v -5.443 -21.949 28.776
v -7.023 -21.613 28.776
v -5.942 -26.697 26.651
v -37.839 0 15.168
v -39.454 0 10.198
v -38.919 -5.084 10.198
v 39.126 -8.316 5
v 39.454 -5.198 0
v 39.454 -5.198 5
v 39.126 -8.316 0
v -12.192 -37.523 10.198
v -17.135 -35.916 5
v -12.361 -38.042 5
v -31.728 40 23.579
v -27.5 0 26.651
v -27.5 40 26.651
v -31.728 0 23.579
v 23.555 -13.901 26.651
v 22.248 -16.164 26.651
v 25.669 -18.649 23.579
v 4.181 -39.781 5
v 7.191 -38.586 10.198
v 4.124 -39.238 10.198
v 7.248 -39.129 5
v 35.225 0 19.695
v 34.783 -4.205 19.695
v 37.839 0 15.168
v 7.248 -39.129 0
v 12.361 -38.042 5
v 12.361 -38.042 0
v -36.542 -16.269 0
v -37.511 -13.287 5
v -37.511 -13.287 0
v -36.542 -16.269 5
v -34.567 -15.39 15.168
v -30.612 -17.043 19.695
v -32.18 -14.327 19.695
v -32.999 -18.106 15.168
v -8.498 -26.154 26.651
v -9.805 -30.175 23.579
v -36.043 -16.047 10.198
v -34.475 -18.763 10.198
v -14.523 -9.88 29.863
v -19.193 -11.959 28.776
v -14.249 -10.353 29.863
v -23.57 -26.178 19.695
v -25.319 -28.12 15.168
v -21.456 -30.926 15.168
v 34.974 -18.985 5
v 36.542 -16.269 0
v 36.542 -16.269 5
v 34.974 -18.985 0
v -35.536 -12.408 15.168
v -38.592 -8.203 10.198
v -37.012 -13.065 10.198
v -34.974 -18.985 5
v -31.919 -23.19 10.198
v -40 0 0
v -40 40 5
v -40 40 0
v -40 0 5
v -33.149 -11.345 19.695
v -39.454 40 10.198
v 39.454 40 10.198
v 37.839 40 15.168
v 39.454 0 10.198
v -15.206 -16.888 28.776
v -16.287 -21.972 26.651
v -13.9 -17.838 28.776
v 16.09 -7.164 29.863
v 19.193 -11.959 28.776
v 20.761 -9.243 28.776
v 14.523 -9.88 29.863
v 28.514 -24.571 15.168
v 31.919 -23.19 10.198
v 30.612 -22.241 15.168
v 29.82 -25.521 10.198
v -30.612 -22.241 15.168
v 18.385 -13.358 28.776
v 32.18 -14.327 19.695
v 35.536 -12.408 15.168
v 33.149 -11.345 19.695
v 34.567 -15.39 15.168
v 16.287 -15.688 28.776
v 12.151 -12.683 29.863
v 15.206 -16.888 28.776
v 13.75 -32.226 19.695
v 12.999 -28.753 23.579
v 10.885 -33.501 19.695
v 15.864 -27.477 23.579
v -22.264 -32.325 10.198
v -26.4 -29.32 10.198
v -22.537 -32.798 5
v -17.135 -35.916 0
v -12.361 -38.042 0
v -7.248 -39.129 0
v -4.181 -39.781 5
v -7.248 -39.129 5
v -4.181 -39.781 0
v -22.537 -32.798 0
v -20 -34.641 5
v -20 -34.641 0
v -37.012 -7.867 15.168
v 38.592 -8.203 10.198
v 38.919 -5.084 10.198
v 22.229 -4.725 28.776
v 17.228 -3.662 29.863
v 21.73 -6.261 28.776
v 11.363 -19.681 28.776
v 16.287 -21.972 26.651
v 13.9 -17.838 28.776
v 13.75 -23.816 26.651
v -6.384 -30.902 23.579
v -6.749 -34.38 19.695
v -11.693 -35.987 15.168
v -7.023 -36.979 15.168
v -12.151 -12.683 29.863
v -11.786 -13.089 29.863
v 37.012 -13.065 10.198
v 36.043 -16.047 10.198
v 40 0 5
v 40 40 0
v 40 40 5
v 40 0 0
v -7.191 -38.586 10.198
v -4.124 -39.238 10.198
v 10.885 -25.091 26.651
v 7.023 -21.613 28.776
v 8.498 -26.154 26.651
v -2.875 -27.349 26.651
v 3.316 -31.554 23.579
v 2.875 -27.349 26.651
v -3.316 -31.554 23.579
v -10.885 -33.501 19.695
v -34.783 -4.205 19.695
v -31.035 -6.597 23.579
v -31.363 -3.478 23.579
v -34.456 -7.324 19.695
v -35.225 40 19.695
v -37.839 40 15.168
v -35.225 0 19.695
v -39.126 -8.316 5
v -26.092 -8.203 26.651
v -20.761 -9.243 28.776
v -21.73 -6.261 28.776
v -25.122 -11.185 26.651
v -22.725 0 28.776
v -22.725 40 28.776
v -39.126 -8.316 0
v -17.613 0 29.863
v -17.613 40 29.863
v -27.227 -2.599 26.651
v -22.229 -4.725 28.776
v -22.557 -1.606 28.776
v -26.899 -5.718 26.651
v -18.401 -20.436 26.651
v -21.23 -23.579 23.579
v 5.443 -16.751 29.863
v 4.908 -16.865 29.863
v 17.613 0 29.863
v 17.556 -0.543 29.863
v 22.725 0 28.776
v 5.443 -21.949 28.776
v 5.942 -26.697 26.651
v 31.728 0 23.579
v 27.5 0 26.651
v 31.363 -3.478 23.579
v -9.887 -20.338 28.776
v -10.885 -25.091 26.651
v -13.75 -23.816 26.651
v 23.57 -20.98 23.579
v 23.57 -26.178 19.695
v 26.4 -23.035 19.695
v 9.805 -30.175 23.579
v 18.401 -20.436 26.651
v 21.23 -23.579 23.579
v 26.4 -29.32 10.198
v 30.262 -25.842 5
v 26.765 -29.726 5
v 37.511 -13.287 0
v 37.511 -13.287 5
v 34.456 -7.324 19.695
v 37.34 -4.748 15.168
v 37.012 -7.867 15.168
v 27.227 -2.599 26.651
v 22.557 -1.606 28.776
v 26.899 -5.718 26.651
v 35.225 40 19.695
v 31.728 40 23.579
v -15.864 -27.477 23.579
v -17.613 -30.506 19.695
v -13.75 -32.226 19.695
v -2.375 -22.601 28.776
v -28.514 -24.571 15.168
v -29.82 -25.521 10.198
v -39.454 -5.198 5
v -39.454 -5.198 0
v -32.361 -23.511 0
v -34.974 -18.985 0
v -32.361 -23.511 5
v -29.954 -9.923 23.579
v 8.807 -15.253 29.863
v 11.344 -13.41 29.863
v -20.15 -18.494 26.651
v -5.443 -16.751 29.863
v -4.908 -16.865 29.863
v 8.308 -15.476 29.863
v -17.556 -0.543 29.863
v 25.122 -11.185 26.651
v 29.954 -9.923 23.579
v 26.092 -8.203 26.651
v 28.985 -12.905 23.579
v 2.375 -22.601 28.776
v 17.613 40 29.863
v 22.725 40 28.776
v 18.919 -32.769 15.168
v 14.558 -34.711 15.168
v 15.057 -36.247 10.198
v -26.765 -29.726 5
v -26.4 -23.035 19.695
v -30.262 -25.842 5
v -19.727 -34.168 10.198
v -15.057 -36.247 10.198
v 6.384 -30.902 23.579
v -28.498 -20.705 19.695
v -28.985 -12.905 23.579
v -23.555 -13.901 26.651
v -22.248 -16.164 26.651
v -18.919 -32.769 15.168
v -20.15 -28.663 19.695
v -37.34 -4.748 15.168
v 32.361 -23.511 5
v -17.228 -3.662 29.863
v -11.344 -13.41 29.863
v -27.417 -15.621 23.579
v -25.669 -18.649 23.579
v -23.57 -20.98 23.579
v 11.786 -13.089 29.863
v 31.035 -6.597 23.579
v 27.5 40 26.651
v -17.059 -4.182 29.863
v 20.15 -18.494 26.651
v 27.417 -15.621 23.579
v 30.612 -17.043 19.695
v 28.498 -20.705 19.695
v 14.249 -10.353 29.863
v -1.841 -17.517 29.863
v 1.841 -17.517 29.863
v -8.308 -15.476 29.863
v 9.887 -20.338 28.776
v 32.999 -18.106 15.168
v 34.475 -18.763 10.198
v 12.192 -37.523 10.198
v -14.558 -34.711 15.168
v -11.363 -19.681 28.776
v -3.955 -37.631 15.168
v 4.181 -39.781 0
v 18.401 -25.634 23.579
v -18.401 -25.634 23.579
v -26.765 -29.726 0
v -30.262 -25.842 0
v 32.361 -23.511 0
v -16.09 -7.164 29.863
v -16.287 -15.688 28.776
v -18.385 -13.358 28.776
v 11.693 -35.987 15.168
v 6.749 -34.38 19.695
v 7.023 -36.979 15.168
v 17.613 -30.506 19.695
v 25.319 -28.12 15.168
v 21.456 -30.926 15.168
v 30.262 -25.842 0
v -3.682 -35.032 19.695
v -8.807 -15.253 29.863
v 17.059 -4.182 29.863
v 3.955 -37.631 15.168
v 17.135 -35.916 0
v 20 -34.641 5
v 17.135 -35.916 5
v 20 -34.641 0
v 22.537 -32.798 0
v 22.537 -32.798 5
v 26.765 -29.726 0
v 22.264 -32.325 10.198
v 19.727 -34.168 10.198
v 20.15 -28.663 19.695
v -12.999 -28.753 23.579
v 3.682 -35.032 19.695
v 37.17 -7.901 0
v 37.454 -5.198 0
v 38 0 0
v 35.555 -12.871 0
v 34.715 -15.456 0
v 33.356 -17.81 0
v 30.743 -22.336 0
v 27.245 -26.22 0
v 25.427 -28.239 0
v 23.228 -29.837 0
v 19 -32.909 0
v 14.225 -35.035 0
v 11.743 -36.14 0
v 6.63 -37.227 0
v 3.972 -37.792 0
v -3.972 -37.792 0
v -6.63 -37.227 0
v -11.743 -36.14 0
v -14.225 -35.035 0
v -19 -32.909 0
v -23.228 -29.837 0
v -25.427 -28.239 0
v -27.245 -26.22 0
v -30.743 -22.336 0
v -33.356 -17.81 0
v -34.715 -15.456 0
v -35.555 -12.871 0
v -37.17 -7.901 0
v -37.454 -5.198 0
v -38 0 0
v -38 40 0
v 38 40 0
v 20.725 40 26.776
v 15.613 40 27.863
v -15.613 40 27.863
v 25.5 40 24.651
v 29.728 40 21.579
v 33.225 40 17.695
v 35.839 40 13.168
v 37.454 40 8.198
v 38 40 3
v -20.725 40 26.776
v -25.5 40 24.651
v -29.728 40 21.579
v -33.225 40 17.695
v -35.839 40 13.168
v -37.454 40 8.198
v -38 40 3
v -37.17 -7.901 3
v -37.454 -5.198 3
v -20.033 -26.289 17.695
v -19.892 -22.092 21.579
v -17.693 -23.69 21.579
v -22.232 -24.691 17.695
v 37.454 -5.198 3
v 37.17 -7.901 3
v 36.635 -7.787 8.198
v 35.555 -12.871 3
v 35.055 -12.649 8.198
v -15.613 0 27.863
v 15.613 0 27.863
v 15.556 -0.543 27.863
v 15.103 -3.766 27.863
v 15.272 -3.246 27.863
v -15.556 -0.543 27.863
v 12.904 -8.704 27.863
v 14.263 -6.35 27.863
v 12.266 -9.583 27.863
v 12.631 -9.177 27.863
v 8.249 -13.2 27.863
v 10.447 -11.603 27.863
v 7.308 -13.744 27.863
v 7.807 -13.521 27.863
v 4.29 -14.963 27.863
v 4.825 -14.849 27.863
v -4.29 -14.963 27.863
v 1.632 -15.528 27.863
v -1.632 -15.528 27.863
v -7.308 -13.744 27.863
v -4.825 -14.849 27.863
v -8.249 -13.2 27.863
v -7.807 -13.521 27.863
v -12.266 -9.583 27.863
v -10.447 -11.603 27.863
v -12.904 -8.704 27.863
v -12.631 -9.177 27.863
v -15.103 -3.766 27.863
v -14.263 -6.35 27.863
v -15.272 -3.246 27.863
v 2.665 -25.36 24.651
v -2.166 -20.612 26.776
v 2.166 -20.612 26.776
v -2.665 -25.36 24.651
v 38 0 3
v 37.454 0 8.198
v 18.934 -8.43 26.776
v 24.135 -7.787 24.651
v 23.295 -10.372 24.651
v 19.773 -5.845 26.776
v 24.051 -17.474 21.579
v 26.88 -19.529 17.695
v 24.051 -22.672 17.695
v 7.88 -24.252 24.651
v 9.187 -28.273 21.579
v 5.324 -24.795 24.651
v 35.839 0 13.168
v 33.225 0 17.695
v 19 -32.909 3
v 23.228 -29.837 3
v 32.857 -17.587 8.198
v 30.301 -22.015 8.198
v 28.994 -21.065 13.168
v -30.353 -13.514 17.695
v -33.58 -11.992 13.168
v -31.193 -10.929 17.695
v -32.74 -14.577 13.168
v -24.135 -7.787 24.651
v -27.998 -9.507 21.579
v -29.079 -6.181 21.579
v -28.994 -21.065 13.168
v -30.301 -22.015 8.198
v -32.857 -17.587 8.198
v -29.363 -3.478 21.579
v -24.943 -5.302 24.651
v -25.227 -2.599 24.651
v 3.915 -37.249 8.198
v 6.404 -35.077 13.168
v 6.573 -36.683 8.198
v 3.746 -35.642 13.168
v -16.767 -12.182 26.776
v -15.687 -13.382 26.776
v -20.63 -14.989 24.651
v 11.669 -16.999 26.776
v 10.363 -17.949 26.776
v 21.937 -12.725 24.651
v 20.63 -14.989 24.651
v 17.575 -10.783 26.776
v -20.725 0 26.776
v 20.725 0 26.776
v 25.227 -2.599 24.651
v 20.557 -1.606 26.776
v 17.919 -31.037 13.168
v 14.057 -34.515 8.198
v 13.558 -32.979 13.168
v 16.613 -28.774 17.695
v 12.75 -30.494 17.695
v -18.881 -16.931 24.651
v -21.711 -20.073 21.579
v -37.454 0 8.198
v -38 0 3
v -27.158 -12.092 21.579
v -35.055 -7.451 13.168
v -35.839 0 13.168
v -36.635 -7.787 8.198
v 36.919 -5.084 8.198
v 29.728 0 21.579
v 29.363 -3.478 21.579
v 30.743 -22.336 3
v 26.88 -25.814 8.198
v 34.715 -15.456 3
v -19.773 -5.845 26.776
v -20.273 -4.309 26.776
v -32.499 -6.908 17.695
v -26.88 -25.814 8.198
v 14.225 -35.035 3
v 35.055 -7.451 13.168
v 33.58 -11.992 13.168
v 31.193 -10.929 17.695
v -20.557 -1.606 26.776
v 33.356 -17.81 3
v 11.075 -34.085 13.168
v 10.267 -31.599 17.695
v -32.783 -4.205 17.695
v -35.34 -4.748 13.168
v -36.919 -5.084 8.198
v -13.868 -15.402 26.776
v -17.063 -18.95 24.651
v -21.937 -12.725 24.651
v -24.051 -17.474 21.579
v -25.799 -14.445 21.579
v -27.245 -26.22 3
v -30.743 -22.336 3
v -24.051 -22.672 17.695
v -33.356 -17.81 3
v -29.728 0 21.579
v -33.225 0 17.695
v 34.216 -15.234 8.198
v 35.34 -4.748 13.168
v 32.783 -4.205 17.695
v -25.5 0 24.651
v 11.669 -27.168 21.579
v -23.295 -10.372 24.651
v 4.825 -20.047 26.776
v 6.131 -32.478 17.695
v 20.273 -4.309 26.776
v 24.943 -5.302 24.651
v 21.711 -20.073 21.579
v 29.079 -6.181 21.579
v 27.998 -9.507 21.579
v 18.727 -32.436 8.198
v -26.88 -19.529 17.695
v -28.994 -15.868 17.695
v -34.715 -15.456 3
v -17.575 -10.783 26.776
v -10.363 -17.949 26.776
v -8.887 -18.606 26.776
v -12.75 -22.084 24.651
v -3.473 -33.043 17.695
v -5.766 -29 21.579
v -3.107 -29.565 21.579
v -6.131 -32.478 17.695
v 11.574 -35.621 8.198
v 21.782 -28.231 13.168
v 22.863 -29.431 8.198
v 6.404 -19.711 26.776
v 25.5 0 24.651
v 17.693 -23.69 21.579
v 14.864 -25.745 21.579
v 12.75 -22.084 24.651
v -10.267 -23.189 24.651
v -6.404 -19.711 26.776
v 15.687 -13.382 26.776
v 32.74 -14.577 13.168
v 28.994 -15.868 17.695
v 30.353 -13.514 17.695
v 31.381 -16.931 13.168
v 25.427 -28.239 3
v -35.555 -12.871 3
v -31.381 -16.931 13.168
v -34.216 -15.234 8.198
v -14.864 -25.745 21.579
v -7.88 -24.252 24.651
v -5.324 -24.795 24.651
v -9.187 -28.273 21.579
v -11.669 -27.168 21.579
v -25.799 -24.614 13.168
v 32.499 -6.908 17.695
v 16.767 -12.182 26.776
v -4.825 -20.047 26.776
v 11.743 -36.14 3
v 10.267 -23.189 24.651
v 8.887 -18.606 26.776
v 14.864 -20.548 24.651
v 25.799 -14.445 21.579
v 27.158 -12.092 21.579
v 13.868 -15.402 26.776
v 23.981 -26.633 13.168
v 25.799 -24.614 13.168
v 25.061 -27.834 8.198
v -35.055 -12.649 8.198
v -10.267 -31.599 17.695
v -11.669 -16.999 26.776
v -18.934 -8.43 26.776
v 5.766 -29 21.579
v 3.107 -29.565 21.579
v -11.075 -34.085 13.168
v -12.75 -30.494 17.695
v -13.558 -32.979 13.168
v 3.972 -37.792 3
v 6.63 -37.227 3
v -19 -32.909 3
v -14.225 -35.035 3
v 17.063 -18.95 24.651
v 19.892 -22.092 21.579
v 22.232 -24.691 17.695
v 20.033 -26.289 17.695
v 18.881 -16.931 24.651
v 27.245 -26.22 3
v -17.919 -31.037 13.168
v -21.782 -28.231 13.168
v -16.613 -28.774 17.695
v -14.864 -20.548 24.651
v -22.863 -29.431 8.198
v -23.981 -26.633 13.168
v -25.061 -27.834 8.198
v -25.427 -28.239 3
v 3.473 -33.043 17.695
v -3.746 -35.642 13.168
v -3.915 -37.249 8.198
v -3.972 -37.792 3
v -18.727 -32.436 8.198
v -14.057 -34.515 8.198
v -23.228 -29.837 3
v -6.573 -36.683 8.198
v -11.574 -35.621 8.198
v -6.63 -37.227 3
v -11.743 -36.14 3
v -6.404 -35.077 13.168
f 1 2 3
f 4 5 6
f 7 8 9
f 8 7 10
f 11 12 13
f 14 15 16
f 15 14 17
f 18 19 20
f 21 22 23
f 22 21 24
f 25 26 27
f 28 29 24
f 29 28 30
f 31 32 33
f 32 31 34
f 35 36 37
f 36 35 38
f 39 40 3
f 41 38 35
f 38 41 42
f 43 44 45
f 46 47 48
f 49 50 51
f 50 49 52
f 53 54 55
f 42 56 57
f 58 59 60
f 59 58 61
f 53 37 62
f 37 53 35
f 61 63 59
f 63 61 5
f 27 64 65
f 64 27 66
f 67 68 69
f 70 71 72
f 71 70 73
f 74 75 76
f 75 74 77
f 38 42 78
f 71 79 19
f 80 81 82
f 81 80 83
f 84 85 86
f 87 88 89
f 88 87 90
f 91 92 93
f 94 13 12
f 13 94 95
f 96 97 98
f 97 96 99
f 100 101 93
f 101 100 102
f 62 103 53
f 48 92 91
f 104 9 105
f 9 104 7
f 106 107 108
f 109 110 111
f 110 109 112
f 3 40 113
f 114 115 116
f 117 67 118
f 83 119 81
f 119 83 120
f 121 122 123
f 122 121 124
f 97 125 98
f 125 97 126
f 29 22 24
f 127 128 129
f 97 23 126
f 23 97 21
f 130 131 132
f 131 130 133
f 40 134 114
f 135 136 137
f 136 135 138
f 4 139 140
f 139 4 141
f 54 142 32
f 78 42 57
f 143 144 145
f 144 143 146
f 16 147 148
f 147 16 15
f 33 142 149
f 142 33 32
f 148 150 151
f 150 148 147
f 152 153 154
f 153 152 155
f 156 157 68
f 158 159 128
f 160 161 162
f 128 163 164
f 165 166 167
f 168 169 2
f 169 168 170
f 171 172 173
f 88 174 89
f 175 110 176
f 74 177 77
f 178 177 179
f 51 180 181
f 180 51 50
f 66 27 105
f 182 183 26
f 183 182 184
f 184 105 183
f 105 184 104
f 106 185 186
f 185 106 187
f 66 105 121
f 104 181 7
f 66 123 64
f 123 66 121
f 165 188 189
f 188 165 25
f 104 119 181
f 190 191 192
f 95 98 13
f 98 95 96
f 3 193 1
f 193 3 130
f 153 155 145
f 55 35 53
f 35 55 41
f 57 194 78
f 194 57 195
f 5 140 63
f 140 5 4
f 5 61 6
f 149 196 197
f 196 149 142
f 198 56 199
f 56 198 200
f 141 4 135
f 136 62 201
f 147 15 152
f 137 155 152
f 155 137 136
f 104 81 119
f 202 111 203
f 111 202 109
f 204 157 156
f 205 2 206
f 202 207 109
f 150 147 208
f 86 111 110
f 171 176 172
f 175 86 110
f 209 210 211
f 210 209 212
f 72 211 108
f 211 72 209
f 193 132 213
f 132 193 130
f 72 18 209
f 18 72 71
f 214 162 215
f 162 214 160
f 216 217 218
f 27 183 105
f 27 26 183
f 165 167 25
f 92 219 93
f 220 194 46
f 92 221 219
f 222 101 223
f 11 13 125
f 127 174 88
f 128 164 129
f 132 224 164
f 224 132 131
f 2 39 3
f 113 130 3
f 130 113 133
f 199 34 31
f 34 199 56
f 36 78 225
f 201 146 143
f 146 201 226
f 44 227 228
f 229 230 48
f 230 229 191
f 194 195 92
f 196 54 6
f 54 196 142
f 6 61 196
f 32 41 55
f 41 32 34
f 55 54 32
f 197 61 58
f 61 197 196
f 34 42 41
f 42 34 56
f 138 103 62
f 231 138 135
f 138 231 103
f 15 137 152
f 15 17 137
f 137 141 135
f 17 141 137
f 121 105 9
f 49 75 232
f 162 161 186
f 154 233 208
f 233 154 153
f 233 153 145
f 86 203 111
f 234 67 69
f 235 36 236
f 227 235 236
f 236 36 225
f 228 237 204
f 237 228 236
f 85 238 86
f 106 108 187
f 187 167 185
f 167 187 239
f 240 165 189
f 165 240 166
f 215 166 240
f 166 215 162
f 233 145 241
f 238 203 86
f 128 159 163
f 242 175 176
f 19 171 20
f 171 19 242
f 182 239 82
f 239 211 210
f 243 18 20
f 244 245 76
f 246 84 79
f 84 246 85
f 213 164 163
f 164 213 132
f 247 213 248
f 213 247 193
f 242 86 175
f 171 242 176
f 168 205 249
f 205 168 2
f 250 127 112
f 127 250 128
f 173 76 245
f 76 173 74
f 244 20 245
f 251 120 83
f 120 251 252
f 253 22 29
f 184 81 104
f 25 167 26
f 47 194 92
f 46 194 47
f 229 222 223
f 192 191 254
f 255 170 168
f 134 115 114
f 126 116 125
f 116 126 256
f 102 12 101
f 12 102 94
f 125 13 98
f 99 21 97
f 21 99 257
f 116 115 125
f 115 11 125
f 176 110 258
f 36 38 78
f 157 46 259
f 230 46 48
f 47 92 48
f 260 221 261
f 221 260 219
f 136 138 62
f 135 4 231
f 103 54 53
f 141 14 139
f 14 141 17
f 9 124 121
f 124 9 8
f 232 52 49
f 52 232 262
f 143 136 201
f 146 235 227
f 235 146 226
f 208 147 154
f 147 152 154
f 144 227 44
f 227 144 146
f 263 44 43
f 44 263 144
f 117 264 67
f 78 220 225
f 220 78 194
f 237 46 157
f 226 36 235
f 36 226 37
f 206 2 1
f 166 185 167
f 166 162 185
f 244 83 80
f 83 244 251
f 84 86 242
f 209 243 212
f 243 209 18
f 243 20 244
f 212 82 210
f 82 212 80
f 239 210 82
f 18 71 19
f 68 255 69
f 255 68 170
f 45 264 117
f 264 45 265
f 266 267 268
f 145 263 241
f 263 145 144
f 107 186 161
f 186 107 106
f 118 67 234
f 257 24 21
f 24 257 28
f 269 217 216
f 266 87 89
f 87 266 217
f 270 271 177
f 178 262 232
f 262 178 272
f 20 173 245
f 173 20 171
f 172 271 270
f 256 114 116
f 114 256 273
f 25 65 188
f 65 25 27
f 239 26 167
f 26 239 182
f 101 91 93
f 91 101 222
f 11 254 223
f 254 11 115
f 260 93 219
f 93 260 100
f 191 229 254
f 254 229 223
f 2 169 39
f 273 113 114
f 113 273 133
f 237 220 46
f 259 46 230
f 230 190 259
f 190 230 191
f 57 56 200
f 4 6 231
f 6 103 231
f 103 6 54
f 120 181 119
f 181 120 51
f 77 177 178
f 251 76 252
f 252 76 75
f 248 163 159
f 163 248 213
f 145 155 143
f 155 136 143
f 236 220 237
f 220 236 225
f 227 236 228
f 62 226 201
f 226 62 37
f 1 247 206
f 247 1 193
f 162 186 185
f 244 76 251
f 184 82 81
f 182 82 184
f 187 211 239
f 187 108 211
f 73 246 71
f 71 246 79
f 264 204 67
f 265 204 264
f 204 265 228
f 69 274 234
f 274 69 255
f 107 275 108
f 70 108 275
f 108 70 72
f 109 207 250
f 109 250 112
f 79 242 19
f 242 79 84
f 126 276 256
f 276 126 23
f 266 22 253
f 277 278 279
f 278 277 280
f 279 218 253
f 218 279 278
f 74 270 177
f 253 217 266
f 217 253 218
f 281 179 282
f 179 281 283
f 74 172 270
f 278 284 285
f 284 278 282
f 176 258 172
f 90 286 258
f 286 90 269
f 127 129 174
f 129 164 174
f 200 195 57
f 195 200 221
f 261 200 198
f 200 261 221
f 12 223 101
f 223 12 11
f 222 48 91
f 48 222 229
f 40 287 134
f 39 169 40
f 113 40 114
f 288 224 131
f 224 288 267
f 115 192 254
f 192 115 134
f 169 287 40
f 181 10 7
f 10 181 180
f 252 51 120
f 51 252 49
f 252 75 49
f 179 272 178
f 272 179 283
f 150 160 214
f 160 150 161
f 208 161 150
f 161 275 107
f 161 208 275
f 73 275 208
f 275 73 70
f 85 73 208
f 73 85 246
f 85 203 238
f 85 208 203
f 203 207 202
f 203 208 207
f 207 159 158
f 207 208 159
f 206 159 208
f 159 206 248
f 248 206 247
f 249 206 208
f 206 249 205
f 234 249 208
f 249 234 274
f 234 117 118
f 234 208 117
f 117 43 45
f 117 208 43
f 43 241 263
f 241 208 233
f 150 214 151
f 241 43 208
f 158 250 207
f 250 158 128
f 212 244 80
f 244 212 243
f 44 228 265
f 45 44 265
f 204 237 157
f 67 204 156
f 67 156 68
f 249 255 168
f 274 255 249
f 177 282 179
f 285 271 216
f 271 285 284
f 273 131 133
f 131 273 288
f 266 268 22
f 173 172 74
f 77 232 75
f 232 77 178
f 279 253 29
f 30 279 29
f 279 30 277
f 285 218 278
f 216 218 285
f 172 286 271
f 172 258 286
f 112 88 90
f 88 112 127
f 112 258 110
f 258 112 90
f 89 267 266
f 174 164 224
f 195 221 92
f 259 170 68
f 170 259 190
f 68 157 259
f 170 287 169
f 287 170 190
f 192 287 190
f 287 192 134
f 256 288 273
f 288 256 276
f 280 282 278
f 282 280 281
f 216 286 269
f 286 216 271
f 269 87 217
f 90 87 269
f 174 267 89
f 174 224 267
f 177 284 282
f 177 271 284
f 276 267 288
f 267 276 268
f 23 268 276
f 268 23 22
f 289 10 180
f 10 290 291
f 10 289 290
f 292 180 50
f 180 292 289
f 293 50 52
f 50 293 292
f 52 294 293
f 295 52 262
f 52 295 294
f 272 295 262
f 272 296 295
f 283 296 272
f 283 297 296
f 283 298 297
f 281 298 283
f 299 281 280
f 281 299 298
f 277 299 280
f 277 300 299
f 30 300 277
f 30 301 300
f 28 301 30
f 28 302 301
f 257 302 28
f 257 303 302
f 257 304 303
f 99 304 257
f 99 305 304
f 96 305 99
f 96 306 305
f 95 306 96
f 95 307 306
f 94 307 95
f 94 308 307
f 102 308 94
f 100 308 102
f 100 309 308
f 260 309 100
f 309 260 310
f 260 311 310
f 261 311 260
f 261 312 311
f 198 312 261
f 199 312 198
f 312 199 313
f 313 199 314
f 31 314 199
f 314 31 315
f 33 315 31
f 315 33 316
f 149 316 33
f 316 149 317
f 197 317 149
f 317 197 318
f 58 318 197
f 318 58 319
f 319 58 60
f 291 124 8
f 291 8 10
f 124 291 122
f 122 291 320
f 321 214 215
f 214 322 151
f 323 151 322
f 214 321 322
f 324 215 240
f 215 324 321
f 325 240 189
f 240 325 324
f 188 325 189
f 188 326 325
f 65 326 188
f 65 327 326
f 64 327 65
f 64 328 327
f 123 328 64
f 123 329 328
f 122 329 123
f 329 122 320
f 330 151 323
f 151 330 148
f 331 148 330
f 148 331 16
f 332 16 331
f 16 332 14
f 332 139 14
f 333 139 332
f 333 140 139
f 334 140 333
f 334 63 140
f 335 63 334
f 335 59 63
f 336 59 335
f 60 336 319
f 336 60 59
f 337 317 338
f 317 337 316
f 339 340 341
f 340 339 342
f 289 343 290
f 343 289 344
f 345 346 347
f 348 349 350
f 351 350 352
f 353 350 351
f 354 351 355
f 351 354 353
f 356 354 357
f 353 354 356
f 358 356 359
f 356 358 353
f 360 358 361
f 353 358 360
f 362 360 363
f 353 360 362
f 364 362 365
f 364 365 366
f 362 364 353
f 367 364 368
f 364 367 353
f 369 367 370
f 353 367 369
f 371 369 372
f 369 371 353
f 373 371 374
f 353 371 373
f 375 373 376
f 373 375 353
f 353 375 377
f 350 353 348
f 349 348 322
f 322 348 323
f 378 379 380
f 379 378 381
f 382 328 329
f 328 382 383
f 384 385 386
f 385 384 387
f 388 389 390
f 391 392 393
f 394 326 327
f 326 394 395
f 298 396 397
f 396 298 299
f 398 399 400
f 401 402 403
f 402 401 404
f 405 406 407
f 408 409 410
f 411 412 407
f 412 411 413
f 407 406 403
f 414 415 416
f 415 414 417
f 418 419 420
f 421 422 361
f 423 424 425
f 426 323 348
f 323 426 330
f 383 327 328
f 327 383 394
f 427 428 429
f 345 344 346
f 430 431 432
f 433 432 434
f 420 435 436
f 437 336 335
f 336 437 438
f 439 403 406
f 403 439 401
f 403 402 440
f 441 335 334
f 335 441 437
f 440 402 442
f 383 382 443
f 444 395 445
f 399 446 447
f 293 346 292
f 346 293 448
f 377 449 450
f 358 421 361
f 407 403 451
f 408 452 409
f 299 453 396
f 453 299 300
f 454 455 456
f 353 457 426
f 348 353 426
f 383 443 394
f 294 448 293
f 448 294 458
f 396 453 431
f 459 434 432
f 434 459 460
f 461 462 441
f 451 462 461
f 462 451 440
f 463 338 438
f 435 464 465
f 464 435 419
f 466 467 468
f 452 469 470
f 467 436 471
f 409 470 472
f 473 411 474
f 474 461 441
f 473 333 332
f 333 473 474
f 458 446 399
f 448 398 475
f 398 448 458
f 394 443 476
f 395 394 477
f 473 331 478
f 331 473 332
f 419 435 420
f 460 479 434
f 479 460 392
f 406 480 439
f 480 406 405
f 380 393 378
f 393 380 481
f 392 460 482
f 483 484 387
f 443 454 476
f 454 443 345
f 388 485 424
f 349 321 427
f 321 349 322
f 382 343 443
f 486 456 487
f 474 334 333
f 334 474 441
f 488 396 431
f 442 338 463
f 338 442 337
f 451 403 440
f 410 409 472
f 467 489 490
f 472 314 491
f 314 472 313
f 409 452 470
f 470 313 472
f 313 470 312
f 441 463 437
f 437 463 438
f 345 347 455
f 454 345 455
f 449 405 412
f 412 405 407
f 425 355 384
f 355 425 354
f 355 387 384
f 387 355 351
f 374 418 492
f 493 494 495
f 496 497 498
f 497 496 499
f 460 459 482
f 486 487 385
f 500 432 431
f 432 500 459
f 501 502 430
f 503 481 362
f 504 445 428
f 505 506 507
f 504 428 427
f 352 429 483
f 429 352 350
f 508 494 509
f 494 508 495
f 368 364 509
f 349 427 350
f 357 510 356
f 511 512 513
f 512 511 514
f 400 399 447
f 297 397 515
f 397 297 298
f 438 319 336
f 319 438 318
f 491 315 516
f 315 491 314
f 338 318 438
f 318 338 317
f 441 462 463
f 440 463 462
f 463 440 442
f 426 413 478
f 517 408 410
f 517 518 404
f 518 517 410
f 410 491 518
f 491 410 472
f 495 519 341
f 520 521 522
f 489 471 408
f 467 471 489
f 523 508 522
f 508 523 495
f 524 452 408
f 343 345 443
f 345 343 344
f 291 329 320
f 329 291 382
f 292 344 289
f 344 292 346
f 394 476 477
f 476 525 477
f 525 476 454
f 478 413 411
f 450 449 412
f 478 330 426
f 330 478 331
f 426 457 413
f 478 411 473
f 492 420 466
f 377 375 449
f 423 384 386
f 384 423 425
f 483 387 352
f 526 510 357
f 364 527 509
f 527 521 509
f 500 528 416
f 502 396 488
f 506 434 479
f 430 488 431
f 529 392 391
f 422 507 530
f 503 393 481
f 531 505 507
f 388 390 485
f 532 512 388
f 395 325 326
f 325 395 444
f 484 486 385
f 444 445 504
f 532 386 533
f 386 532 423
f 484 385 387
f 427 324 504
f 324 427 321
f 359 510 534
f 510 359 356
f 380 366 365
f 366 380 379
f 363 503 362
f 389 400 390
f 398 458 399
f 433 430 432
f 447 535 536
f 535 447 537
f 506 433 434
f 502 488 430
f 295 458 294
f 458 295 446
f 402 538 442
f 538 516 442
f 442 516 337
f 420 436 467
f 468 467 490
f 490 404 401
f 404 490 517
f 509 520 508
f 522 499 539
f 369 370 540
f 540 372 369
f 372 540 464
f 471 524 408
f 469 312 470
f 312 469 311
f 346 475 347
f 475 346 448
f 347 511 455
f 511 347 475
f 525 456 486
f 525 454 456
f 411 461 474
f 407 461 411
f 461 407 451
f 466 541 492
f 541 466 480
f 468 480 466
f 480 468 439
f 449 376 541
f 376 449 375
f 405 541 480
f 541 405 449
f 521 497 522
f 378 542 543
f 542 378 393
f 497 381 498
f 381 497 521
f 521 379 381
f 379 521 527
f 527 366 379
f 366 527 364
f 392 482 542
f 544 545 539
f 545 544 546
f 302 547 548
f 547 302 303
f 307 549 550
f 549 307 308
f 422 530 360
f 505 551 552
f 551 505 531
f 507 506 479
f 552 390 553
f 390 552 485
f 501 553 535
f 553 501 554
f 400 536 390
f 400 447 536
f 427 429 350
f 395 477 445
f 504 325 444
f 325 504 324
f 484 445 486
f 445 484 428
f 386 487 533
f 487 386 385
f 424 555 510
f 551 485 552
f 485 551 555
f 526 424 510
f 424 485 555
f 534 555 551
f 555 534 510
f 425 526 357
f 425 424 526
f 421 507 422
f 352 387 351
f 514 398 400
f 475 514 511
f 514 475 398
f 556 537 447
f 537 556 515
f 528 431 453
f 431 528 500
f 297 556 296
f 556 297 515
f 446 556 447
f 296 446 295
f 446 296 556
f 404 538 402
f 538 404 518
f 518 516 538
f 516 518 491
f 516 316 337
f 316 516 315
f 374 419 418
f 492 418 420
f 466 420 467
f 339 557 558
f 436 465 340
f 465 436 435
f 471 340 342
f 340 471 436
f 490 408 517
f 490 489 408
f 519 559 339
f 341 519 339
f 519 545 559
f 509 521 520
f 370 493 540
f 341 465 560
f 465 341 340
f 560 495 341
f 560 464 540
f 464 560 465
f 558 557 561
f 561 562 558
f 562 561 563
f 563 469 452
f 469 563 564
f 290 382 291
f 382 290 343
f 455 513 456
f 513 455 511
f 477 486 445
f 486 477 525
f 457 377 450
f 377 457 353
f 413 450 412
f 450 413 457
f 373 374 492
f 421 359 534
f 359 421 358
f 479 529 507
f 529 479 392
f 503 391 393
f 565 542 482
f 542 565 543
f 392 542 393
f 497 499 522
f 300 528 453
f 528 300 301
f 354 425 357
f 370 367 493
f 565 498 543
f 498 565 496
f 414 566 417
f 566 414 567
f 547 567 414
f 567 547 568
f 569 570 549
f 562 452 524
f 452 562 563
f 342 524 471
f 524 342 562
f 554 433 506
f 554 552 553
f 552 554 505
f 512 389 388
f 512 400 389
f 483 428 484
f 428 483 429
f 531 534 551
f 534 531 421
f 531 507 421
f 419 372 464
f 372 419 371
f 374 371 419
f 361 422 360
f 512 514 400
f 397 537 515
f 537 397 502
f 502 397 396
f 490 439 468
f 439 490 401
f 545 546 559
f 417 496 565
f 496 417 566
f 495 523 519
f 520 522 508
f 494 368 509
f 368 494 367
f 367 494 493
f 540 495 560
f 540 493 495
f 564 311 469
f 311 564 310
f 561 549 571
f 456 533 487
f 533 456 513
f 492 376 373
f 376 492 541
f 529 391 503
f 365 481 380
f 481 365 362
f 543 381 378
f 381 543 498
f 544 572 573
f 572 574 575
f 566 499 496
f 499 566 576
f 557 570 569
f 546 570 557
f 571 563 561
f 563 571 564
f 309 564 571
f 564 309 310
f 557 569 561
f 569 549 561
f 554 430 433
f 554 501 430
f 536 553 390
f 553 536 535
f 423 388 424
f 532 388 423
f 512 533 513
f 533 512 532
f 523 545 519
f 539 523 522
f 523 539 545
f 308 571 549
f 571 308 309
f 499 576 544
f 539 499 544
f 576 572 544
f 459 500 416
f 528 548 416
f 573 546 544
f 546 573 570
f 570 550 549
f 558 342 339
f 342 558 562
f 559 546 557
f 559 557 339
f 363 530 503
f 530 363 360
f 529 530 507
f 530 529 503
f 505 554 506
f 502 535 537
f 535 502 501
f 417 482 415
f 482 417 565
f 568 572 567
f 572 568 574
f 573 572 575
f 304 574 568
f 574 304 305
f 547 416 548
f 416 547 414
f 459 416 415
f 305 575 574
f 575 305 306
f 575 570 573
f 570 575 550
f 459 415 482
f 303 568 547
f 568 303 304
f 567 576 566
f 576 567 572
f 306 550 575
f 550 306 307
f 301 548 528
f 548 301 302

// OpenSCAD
CR = 25; /* corner radius */
SX = 80; /* size X (width) */
SY = 80; /* size Y (depth) */
H = 30; /* height */
WT = 2; /* wall thickness */

module baseShape(x, y, z) {
    difference() {
        minkowski() {
            linear_extrude(z-CR) {
                circle(d=x-2*CR);
                translate([0,y/2-x/4]) square([x-2*CR,y-x/2], center=true);
            }
            /* round off corners: */
            sphere(r=CR);
        }
        /* cut bottom flat: */
        translate([0,y-x,-CR/2]) cube([x+2*CR,y+2*CR,CR], center=true);
        /* cut front flat: */
        translate([0,y-x/2+CR/2,H/2]) cube([x+2*CR,CR,H], center=true);
    }
}

difference() {
    baseShape(SX, SY, H);
    baseShape(SX-2*WT, SY, H-WT);
}
